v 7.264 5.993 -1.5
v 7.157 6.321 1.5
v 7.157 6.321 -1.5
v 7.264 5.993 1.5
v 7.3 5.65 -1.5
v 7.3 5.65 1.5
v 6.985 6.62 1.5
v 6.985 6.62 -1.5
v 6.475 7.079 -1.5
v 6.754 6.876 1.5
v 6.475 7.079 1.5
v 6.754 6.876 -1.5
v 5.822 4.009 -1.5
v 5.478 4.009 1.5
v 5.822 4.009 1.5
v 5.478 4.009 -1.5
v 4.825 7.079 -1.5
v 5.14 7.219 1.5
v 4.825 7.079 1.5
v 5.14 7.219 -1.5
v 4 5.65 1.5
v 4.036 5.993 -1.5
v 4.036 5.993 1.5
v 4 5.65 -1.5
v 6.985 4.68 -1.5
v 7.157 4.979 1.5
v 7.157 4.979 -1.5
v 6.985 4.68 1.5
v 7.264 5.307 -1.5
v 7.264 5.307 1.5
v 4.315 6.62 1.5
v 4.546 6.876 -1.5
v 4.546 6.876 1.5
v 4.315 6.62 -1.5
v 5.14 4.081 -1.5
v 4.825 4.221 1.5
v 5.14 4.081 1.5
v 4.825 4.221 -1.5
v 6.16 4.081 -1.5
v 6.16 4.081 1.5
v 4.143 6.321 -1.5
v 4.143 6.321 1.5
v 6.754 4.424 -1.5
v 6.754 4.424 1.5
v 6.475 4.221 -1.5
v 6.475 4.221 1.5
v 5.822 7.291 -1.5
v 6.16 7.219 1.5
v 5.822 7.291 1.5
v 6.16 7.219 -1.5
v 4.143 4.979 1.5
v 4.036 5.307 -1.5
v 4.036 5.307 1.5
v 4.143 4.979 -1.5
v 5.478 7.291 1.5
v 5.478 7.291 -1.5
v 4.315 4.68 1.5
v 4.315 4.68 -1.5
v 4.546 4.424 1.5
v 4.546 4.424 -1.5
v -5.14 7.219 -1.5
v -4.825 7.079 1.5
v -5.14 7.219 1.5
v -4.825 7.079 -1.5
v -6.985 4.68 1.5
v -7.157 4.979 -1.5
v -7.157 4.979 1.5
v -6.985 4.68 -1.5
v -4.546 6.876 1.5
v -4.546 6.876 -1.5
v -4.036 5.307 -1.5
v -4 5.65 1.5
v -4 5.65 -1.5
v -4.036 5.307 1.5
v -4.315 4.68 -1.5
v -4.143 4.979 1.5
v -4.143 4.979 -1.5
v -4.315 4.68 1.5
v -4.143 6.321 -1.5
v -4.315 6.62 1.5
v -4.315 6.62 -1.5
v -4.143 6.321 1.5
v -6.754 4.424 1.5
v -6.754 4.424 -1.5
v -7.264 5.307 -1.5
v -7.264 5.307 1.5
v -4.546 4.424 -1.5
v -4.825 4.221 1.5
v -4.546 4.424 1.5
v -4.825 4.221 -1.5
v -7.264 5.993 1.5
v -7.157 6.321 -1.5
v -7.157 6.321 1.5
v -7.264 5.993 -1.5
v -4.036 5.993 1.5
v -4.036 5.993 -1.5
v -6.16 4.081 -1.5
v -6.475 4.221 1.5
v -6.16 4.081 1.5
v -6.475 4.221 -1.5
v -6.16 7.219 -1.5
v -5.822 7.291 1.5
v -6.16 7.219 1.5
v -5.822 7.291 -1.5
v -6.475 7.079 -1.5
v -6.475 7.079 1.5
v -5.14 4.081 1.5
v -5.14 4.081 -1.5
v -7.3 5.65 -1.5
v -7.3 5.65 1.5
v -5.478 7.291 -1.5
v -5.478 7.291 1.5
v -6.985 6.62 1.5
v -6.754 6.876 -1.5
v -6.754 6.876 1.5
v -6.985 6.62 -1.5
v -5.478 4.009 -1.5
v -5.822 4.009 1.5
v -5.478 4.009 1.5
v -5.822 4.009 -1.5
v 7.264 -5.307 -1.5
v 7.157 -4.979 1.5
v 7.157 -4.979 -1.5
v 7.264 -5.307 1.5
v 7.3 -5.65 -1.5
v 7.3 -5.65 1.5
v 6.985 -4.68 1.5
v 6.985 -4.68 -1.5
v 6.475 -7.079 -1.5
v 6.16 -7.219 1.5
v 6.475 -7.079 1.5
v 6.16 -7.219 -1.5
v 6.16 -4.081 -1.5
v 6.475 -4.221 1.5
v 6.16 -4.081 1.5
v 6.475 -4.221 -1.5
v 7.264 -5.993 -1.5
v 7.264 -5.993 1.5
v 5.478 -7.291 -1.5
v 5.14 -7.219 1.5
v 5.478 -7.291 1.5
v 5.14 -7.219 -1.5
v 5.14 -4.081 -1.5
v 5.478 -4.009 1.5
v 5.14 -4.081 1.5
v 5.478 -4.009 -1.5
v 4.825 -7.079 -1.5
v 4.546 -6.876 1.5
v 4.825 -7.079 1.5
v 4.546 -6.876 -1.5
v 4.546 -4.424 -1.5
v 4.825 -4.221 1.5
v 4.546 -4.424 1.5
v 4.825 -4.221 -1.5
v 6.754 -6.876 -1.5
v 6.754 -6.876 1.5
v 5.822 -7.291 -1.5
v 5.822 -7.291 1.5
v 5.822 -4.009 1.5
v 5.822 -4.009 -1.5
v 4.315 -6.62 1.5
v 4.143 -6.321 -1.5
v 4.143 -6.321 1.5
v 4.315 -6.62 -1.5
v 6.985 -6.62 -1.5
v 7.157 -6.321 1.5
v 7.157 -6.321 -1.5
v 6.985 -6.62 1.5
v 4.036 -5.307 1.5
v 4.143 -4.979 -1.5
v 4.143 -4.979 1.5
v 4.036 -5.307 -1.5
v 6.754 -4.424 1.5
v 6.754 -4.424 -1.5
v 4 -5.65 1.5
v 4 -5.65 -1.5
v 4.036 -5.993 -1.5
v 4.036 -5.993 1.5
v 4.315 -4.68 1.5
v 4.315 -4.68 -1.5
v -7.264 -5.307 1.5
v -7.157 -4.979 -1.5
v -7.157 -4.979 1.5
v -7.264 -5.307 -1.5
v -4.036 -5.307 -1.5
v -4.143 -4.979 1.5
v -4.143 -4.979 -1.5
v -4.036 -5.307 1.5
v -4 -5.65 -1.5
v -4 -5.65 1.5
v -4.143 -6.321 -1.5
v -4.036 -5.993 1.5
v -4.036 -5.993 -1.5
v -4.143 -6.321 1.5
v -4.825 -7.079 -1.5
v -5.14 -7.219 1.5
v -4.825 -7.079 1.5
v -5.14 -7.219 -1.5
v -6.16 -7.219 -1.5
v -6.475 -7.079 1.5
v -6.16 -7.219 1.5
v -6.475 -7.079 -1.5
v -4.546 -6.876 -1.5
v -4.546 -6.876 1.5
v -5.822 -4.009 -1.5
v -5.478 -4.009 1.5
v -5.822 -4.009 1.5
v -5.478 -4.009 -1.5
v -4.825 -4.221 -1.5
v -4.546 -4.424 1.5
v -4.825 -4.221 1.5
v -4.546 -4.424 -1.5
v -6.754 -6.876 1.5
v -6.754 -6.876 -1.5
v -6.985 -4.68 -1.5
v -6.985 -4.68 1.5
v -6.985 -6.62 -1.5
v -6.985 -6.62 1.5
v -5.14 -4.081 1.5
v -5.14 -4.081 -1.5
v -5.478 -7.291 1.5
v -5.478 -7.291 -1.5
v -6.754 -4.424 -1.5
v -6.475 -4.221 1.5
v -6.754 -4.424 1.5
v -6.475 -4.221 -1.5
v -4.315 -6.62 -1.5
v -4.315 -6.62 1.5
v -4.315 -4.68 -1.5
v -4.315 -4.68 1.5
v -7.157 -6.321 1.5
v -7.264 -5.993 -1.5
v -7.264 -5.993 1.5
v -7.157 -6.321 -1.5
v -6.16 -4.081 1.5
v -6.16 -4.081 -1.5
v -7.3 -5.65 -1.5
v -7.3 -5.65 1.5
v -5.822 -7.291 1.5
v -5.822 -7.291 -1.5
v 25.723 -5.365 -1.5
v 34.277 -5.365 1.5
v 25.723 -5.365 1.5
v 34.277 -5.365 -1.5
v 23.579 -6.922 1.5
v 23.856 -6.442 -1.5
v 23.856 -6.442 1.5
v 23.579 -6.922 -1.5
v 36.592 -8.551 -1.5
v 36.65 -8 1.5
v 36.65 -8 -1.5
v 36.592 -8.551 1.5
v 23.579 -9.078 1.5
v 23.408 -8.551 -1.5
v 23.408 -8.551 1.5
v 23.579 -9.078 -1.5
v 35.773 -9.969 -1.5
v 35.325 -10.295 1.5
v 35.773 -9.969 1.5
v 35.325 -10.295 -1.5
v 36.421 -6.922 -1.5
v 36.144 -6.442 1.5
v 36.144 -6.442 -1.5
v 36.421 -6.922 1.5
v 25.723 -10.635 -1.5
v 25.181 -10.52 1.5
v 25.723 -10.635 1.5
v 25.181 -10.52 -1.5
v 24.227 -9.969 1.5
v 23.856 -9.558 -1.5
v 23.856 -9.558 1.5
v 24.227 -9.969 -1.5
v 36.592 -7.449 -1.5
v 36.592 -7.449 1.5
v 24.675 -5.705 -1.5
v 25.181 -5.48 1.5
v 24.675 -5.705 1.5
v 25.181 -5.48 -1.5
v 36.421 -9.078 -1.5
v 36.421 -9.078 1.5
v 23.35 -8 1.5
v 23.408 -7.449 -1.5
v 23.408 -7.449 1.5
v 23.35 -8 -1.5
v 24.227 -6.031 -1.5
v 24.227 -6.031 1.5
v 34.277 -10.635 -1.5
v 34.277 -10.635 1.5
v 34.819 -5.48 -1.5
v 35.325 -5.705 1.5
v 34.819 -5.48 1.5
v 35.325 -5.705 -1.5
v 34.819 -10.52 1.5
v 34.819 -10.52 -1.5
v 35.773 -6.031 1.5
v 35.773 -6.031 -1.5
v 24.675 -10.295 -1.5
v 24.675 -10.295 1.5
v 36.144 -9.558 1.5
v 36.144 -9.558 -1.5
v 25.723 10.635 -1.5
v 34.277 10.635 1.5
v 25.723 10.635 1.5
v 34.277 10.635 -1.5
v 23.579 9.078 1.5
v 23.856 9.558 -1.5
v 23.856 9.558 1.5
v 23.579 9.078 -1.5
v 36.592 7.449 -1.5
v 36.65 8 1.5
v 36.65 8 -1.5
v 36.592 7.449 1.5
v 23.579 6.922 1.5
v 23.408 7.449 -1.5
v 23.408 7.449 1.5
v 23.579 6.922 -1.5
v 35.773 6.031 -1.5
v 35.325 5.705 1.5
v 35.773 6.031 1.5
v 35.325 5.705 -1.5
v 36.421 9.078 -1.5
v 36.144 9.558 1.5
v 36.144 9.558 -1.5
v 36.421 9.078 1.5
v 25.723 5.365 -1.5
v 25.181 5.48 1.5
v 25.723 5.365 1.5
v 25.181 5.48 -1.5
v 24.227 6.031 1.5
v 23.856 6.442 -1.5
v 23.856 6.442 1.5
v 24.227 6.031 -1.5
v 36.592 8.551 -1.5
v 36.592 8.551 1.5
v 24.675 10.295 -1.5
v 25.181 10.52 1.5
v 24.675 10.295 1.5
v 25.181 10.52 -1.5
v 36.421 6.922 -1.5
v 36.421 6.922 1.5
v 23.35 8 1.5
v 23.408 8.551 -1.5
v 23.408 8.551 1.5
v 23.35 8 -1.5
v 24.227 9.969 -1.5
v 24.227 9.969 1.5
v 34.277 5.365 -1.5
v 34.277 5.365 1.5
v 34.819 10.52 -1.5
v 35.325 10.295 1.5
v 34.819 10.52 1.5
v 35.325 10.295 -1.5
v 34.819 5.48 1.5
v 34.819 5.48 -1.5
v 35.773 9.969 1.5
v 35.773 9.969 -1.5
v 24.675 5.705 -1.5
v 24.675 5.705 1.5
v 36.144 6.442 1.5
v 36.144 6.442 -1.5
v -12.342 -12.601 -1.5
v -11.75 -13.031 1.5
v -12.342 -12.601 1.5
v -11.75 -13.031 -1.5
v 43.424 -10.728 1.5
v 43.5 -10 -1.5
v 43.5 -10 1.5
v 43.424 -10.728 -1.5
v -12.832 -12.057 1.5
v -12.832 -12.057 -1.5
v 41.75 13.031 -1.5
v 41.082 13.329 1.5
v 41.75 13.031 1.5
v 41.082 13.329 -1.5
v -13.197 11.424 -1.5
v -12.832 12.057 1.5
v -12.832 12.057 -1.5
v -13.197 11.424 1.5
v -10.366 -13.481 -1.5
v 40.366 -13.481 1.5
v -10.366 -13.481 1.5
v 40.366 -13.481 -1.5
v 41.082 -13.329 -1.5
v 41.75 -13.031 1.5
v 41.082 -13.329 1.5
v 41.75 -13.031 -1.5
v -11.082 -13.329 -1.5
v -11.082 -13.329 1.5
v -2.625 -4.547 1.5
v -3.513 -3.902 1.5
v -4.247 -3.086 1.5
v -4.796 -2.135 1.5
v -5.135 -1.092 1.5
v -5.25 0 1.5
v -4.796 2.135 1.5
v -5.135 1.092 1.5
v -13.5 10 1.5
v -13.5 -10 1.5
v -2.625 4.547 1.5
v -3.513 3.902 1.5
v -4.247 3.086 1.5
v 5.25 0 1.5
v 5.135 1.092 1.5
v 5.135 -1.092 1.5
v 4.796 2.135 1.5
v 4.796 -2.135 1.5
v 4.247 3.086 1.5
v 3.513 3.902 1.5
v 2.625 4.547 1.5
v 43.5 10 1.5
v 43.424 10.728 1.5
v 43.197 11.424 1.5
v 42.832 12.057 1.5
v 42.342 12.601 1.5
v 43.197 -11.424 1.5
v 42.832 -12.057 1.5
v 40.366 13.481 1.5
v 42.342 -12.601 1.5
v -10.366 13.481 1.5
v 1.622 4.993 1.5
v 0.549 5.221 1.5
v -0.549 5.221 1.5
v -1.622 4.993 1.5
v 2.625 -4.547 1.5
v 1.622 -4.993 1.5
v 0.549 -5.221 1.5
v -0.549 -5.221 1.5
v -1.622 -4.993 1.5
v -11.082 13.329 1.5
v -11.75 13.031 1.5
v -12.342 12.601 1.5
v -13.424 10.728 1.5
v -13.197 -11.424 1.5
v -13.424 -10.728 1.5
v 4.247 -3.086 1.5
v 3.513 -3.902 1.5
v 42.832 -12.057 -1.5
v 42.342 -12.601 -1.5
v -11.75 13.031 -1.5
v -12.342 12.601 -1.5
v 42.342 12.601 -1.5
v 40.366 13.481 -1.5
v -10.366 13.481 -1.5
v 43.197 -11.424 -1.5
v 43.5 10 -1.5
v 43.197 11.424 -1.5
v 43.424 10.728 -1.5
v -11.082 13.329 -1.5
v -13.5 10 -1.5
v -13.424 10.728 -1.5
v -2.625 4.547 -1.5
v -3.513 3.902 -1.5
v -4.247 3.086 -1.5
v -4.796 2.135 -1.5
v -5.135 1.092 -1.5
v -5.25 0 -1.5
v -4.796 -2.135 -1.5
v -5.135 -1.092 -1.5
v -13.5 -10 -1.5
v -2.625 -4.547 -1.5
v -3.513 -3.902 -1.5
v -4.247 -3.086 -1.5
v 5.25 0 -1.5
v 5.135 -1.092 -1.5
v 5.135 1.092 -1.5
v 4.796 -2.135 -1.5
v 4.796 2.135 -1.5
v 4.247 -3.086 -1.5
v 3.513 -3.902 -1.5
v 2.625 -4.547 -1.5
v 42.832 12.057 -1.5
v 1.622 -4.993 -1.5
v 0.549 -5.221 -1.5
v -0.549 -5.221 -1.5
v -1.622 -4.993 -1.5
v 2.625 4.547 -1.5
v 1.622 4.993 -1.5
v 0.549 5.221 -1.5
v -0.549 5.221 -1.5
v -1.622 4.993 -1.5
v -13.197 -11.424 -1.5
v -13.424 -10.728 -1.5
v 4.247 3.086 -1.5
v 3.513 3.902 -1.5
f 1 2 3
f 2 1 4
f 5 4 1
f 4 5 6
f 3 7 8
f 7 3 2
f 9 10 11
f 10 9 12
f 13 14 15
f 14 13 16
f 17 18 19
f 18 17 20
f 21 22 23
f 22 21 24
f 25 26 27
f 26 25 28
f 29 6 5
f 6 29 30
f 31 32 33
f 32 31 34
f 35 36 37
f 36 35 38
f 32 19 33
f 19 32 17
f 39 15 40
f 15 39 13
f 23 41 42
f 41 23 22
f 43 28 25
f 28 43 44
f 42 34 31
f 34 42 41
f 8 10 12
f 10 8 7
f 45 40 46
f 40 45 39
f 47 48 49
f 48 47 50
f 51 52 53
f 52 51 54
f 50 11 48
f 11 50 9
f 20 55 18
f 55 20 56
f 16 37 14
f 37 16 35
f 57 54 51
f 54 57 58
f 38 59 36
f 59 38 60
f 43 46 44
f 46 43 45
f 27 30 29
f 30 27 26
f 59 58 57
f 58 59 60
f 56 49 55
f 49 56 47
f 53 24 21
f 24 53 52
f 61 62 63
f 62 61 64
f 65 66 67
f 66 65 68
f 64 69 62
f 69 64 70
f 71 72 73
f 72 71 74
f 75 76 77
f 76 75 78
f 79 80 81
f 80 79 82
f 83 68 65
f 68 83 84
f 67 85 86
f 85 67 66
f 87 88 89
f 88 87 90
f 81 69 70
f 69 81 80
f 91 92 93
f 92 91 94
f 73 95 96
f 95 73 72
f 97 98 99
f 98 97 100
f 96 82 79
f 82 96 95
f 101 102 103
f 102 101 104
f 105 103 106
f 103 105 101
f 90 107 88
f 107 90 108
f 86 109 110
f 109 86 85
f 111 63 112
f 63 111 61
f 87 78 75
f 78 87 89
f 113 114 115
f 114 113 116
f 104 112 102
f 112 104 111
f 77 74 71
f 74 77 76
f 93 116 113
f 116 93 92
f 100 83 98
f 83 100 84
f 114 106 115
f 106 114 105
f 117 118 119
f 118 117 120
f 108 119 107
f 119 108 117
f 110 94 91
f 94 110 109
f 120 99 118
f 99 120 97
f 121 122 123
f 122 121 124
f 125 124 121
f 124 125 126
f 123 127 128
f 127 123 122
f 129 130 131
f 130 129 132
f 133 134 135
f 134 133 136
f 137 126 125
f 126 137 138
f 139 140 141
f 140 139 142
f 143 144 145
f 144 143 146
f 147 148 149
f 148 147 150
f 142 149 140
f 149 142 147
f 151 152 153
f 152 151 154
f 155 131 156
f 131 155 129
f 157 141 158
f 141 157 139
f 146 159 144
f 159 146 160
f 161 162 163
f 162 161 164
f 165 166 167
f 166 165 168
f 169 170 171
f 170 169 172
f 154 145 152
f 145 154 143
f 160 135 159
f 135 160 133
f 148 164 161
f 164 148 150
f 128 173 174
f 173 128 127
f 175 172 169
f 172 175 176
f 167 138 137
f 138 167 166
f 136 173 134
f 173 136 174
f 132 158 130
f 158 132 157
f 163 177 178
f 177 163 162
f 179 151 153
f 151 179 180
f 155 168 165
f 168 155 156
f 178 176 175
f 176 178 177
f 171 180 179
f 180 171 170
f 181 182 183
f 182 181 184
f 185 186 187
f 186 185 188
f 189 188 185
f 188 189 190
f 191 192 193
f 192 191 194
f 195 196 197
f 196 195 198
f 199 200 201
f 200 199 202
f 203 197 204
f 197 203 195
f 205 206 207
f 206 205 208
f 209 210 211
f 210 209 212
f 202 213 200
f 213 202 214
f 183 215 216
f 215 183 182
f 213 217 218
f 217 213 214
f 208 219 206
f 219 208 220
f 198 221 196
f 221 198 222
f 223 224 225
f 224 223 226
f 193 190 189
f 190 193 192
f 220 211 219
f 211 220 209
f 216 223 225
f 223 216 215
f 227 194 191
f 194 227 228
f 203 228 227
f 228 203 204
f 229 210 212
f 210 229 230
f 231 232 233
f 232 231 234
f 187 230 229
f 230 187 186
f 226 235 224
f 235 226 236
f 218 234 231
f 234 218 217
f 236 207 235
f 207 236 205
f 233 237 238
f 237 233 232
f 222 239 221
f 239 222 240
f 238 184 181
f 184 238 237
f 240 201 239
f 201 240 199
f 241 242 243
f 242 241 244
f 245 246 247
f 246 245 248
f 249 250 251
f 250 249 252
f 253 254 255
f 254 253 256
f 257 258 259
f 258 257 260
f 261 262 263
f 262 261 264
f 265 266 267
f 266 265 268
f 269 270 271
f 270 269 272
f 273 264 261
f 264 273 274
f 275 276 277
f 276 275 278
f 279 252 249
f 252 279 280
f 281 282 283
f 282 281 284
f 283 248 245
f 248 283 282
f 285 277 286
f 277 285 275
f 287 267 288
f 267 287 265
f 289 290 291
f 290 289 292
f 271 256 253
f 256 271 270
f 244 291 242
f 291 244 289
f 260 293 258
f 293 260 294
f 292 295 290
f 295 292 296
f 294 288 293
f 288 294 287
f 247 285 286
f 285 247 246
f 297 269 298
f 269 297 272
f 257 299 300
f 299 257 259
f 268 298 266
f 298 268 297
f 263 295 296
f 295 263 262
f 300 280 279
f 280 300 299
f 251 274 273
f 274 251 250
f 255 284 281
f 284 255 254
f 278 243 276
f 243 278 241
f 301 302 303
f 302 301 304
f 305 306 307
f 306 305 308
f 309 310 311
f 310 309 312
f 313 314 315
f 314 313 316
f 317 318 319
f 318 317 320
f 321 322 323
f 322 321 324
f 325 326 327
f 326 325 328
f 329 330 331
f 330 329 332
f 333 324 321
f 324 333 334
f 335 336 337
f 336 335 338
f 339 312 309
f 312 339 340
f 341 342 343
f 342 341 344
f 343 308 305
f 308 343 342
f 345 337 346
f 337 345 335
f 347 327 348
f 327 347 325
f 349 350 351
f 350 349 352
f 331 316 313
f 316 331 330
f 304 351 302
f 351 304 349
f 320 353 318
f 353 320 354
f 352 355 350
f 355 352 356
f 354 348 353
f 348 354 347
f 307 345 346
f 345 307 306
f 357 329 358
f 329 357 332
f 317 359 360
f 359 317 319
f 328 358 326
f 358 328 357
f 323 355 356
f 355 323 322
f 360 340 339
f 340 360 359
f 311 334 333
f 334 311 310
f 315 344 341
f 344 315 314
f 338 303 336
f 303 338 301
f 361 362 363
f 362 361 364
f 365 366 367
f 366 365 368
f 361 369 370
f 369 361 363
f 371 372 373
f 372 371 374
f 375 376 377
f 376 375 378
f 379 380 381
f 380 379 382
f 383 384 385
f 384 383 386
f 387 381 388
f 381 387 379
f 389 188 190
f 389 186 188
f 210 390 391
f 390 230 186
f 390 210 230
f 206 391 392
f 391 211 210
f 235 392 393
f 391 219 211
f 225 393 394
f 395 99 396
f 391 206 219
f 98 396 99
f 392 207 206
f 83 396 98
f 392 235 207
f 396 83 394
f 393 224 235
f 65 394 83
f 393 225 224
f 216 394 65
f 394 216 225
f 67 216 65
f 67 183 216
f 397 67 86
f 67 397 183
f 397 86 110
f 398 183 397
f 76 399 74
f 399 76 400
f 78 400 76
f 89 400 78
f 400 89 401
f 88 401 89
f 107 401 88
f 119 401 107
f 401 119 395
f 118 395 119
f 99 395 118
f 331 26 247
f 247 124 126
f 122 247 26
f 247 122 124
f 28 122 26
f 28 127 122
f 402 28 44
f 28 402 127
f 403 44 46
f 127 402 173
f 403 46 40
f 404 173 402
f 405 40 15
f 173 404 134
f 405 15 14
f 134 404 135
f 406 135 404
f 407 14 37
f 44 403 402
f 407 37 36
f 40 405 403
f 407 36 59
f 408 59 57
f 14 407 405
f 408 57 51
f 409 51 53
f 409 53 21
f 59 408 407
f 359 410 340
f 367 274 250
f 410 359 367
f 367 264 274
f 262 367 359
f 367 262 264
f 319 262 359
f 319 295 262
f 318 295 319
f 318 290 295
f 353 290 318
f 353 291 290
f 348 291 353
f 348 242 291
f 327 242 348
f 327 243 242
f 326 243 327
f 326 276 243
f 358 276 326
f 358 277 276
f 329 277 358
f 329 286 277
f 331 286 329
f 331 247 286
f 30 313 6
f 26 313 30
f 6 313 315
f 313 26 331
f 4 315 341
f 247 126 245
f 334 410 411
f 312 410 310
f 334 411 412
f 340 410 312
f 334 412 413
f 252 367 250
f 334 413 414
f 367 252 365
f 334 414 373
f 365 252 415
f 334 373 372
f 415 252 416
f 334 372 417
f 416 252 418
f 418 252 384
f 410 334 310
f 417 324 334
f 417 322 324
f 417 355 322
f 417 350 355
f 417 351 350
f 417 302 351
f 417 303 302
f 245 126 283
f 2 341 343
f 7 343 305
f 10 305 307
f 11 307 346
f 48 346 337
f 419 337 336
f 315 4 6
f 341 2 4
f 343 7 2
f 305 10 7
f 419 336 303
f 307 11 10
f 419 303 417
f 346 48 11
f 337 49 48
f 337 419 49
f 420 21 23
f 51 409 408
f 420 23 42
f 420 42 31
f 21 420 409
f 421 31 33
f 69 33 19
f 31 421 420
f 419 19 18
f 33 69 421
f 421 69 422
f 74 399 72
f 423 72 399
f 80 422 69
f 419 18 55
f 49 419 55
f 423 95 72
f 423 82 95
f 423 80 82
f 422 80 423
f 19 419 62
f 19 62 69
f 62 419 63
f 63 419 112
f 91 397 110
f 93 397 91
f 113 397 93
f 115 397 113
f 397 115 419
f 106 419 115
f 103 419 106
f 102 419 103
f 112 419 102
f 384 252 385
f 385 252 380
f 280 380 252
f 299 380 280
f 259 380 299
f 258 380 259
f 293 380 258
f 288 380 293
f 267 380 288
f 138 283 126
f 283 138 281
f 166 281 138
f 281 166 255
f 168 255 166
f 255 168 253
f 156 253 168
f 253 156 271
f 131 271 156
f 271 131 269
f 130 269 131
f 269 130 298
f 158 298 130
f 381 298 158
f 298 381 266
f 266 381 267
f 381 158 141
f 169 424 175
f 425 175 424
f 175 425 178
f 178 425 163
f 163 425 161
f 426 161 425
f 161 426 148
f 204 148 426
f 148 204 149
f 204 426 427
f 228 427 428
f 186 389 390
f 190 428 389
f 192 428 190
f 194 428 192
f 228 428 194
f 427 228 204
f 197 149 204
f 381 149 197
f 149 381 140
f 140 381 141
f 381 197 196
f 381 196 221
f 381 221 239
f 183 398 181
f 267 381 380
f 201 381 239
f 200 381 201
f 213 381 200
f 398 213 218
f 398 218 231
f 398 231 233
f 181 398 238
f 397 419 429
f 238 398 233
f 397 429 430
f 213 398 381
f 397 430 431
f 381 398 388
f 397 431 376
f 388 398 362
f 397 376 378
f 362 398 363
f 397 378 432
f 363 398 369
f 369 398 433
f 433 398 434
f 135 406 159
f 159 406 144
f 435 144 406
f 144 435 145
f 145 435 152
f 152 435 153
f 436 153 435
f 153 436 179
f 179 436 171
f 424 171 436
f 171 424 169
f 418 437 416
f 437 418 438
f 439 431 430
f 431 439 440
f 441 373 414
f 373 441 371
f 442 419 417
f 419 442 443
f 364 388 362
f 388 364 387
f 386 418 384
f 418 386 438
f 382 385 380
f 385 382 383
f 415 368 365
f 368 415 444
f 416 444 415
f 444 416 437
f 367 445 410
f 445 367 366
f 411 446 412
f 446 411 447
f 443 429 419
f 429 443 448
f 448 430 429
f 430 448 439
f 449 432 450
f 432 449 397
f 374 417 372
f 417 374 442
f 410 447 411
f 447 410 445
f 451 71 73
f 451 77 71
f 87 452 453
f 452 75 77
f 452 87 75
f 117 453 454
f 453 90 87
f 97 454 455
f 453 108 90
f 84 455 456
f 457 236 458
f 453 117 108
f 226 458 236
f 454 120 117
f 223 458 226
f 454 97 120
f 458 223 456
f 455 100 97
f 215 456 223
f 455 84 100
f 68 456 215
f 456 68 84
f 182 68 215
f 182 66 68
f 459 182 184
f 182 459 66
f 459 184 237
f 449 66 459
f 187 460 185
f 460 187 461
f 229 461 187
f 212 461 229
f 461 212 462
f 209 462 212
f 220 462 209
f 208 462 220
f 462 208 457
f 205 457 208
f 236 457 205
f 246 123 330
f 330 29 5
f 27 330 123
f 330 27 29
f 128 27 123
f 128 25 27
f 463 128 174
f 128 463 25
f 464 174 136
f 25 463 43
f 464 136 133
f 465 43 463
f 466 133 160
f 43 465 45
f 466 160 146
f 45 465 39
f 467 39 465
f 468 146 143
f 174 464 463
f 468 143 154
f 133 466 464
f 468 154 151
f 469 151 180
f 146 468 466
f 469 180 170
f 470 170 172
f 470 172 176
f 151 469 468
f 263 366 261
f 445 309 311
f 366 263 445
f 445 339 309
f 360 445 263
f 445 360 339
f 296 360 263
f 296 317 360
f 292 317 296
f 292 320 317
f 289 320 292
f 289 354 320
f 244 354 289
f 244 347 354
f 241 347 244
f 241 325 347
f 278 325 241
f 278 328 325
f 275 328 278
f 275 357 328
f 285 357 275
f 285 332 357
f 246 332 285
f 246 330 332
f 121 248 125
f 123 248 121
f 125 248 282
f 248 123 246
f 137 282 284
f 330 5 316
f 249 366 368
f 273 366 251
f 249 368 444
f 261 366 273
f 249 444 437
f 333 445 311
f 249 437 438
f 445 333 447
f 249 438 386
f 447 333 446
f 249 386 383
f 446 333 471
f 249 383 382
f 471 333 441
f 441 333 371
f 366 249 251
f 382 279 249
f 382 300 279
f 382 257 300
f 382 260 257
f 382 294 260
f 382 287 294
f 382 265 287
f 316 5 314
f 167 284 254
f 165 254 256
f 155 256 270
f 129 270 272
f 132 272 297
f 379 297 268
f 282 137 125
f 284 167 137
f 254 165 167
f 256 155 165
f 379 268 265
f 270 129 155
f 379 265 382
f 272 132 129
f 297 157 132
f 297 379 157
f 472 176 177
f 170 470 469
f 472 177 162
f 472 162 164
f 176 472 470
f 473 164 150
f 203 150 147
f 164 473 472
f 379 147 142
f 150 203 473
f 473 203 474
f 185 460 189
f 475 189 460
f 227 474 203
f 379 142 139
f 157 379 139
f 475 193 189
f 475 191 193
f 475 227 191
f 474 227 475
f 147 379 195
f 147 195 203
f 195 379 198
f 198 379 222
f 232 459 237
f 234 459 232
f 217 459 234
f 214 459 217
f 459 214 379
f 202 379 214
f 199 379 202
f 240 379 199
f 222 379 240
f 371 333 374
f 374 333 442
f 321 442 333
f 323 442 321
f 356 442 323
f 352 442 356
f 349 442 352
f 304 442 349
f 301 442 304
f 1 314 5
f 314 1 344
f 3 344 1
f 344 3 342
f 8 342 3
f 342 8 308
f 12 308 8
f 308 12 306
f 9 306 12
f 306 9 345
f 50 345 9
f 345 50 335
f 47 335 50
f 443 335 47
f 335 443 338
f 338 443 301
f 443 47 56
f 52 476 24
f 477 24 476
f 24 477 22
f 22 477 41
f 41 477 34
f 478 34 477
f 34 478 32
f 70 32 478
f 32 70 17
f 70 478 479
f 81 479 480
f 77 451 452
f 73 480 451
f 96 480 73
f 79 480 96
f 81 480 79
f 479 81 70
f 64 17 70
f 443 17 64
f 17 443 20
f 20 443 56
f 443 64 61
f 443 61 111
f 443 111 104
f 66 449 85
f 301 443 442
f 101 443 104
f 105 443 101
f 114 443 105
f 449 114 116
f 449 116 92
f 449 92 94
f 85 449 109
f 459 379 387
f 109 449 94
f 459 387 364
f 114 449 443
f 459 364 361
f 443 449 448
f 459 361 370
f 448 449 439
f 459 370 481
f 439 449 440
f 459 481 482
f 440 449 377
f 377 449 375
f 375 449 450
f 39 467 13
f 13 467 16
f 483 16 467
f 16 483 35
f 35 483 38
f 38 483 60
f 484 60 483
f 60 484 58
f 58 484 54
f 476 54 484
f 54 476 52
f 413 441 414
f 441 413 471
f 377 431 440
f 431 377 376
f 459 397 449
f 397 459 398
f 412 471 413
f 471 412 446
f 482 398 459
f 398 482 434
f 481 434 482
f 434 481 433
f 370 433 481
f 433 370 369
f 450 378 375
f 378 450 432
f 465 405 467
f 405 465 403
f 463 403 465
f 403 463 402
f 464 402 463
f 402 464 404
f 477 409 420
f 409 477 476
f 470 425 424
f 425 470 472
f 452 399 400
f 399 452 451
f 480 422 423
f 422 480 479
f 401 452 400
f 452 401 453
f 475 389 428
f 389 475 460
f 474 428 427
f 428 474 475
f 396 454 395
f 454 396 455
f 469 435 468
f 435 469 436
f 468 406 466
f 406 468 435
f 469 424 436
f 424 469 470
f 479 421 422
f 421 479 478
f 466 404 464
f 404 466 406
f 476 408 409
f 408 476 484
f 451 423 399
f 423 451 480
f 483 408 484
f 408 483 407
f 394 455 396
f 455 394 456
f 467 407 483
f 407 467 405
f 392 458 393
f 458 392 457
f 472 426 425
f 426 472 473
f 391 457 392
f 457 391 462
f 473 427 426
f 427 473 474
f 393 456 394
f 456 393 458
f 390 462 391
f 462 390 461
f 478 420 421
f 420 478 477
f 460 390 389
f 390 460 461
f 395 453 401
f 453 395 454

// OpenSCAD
$fn=30;

//color("green") translate([9,0,0]) cube([43,2,10],center=true);



difference(){
	Plate(10,40,3);
	cylinder(h=20,d=10.5,center=true);
	ScrewHoles(11.3);
	translate([30,0,0]) ScrewSlots(8);
}

module ScrewSlots(Space){
	color("red") translate([0,-Space,0]) ScrewSlot(8);
	color("red") translate([0,Space,0]) ScrewSlot(8);
}
module ScrewSlot(Size){
	hull(){	
		color("green") translate([Size/2,0,0]) cylinder(h=10, d=5.3, center=true);
		color("blue") translate([-Size/2,0,0]) cylinder(h=10, d=5.3, center=true);
	}
}

module ScrewHoles(Space){
	translate([Space/2,Space/2,0]) cylinder(h=15, d=3.3, center=true);
	translate([-Space/2,Space/2,0]) cylinder(h=15, d=3.3, center=true);
	translate([Space/2,-Space/2,0]) cylinder(h=15, d=3.3, center=true);
	translate([-Space/2,-Space/2,0]) cylinder(h=15, d=3.3, center=true);
}

module Plate(Width,length,Height){
	hull(){
		color("green") translate([length,Width,0]) cylinder(h=Height, d=7, center=true);
		color("blue") translate([length,-Width,0]) cylinder(h=Height, d=7, center=true);
		color("red") translate([-Width,Width,0]) cylinder(h=Height, d=7, center=true);
		color("grey") translate([-Width,-Width,0]) cylinder(h=Height, d=7, center=true);
	}
}
